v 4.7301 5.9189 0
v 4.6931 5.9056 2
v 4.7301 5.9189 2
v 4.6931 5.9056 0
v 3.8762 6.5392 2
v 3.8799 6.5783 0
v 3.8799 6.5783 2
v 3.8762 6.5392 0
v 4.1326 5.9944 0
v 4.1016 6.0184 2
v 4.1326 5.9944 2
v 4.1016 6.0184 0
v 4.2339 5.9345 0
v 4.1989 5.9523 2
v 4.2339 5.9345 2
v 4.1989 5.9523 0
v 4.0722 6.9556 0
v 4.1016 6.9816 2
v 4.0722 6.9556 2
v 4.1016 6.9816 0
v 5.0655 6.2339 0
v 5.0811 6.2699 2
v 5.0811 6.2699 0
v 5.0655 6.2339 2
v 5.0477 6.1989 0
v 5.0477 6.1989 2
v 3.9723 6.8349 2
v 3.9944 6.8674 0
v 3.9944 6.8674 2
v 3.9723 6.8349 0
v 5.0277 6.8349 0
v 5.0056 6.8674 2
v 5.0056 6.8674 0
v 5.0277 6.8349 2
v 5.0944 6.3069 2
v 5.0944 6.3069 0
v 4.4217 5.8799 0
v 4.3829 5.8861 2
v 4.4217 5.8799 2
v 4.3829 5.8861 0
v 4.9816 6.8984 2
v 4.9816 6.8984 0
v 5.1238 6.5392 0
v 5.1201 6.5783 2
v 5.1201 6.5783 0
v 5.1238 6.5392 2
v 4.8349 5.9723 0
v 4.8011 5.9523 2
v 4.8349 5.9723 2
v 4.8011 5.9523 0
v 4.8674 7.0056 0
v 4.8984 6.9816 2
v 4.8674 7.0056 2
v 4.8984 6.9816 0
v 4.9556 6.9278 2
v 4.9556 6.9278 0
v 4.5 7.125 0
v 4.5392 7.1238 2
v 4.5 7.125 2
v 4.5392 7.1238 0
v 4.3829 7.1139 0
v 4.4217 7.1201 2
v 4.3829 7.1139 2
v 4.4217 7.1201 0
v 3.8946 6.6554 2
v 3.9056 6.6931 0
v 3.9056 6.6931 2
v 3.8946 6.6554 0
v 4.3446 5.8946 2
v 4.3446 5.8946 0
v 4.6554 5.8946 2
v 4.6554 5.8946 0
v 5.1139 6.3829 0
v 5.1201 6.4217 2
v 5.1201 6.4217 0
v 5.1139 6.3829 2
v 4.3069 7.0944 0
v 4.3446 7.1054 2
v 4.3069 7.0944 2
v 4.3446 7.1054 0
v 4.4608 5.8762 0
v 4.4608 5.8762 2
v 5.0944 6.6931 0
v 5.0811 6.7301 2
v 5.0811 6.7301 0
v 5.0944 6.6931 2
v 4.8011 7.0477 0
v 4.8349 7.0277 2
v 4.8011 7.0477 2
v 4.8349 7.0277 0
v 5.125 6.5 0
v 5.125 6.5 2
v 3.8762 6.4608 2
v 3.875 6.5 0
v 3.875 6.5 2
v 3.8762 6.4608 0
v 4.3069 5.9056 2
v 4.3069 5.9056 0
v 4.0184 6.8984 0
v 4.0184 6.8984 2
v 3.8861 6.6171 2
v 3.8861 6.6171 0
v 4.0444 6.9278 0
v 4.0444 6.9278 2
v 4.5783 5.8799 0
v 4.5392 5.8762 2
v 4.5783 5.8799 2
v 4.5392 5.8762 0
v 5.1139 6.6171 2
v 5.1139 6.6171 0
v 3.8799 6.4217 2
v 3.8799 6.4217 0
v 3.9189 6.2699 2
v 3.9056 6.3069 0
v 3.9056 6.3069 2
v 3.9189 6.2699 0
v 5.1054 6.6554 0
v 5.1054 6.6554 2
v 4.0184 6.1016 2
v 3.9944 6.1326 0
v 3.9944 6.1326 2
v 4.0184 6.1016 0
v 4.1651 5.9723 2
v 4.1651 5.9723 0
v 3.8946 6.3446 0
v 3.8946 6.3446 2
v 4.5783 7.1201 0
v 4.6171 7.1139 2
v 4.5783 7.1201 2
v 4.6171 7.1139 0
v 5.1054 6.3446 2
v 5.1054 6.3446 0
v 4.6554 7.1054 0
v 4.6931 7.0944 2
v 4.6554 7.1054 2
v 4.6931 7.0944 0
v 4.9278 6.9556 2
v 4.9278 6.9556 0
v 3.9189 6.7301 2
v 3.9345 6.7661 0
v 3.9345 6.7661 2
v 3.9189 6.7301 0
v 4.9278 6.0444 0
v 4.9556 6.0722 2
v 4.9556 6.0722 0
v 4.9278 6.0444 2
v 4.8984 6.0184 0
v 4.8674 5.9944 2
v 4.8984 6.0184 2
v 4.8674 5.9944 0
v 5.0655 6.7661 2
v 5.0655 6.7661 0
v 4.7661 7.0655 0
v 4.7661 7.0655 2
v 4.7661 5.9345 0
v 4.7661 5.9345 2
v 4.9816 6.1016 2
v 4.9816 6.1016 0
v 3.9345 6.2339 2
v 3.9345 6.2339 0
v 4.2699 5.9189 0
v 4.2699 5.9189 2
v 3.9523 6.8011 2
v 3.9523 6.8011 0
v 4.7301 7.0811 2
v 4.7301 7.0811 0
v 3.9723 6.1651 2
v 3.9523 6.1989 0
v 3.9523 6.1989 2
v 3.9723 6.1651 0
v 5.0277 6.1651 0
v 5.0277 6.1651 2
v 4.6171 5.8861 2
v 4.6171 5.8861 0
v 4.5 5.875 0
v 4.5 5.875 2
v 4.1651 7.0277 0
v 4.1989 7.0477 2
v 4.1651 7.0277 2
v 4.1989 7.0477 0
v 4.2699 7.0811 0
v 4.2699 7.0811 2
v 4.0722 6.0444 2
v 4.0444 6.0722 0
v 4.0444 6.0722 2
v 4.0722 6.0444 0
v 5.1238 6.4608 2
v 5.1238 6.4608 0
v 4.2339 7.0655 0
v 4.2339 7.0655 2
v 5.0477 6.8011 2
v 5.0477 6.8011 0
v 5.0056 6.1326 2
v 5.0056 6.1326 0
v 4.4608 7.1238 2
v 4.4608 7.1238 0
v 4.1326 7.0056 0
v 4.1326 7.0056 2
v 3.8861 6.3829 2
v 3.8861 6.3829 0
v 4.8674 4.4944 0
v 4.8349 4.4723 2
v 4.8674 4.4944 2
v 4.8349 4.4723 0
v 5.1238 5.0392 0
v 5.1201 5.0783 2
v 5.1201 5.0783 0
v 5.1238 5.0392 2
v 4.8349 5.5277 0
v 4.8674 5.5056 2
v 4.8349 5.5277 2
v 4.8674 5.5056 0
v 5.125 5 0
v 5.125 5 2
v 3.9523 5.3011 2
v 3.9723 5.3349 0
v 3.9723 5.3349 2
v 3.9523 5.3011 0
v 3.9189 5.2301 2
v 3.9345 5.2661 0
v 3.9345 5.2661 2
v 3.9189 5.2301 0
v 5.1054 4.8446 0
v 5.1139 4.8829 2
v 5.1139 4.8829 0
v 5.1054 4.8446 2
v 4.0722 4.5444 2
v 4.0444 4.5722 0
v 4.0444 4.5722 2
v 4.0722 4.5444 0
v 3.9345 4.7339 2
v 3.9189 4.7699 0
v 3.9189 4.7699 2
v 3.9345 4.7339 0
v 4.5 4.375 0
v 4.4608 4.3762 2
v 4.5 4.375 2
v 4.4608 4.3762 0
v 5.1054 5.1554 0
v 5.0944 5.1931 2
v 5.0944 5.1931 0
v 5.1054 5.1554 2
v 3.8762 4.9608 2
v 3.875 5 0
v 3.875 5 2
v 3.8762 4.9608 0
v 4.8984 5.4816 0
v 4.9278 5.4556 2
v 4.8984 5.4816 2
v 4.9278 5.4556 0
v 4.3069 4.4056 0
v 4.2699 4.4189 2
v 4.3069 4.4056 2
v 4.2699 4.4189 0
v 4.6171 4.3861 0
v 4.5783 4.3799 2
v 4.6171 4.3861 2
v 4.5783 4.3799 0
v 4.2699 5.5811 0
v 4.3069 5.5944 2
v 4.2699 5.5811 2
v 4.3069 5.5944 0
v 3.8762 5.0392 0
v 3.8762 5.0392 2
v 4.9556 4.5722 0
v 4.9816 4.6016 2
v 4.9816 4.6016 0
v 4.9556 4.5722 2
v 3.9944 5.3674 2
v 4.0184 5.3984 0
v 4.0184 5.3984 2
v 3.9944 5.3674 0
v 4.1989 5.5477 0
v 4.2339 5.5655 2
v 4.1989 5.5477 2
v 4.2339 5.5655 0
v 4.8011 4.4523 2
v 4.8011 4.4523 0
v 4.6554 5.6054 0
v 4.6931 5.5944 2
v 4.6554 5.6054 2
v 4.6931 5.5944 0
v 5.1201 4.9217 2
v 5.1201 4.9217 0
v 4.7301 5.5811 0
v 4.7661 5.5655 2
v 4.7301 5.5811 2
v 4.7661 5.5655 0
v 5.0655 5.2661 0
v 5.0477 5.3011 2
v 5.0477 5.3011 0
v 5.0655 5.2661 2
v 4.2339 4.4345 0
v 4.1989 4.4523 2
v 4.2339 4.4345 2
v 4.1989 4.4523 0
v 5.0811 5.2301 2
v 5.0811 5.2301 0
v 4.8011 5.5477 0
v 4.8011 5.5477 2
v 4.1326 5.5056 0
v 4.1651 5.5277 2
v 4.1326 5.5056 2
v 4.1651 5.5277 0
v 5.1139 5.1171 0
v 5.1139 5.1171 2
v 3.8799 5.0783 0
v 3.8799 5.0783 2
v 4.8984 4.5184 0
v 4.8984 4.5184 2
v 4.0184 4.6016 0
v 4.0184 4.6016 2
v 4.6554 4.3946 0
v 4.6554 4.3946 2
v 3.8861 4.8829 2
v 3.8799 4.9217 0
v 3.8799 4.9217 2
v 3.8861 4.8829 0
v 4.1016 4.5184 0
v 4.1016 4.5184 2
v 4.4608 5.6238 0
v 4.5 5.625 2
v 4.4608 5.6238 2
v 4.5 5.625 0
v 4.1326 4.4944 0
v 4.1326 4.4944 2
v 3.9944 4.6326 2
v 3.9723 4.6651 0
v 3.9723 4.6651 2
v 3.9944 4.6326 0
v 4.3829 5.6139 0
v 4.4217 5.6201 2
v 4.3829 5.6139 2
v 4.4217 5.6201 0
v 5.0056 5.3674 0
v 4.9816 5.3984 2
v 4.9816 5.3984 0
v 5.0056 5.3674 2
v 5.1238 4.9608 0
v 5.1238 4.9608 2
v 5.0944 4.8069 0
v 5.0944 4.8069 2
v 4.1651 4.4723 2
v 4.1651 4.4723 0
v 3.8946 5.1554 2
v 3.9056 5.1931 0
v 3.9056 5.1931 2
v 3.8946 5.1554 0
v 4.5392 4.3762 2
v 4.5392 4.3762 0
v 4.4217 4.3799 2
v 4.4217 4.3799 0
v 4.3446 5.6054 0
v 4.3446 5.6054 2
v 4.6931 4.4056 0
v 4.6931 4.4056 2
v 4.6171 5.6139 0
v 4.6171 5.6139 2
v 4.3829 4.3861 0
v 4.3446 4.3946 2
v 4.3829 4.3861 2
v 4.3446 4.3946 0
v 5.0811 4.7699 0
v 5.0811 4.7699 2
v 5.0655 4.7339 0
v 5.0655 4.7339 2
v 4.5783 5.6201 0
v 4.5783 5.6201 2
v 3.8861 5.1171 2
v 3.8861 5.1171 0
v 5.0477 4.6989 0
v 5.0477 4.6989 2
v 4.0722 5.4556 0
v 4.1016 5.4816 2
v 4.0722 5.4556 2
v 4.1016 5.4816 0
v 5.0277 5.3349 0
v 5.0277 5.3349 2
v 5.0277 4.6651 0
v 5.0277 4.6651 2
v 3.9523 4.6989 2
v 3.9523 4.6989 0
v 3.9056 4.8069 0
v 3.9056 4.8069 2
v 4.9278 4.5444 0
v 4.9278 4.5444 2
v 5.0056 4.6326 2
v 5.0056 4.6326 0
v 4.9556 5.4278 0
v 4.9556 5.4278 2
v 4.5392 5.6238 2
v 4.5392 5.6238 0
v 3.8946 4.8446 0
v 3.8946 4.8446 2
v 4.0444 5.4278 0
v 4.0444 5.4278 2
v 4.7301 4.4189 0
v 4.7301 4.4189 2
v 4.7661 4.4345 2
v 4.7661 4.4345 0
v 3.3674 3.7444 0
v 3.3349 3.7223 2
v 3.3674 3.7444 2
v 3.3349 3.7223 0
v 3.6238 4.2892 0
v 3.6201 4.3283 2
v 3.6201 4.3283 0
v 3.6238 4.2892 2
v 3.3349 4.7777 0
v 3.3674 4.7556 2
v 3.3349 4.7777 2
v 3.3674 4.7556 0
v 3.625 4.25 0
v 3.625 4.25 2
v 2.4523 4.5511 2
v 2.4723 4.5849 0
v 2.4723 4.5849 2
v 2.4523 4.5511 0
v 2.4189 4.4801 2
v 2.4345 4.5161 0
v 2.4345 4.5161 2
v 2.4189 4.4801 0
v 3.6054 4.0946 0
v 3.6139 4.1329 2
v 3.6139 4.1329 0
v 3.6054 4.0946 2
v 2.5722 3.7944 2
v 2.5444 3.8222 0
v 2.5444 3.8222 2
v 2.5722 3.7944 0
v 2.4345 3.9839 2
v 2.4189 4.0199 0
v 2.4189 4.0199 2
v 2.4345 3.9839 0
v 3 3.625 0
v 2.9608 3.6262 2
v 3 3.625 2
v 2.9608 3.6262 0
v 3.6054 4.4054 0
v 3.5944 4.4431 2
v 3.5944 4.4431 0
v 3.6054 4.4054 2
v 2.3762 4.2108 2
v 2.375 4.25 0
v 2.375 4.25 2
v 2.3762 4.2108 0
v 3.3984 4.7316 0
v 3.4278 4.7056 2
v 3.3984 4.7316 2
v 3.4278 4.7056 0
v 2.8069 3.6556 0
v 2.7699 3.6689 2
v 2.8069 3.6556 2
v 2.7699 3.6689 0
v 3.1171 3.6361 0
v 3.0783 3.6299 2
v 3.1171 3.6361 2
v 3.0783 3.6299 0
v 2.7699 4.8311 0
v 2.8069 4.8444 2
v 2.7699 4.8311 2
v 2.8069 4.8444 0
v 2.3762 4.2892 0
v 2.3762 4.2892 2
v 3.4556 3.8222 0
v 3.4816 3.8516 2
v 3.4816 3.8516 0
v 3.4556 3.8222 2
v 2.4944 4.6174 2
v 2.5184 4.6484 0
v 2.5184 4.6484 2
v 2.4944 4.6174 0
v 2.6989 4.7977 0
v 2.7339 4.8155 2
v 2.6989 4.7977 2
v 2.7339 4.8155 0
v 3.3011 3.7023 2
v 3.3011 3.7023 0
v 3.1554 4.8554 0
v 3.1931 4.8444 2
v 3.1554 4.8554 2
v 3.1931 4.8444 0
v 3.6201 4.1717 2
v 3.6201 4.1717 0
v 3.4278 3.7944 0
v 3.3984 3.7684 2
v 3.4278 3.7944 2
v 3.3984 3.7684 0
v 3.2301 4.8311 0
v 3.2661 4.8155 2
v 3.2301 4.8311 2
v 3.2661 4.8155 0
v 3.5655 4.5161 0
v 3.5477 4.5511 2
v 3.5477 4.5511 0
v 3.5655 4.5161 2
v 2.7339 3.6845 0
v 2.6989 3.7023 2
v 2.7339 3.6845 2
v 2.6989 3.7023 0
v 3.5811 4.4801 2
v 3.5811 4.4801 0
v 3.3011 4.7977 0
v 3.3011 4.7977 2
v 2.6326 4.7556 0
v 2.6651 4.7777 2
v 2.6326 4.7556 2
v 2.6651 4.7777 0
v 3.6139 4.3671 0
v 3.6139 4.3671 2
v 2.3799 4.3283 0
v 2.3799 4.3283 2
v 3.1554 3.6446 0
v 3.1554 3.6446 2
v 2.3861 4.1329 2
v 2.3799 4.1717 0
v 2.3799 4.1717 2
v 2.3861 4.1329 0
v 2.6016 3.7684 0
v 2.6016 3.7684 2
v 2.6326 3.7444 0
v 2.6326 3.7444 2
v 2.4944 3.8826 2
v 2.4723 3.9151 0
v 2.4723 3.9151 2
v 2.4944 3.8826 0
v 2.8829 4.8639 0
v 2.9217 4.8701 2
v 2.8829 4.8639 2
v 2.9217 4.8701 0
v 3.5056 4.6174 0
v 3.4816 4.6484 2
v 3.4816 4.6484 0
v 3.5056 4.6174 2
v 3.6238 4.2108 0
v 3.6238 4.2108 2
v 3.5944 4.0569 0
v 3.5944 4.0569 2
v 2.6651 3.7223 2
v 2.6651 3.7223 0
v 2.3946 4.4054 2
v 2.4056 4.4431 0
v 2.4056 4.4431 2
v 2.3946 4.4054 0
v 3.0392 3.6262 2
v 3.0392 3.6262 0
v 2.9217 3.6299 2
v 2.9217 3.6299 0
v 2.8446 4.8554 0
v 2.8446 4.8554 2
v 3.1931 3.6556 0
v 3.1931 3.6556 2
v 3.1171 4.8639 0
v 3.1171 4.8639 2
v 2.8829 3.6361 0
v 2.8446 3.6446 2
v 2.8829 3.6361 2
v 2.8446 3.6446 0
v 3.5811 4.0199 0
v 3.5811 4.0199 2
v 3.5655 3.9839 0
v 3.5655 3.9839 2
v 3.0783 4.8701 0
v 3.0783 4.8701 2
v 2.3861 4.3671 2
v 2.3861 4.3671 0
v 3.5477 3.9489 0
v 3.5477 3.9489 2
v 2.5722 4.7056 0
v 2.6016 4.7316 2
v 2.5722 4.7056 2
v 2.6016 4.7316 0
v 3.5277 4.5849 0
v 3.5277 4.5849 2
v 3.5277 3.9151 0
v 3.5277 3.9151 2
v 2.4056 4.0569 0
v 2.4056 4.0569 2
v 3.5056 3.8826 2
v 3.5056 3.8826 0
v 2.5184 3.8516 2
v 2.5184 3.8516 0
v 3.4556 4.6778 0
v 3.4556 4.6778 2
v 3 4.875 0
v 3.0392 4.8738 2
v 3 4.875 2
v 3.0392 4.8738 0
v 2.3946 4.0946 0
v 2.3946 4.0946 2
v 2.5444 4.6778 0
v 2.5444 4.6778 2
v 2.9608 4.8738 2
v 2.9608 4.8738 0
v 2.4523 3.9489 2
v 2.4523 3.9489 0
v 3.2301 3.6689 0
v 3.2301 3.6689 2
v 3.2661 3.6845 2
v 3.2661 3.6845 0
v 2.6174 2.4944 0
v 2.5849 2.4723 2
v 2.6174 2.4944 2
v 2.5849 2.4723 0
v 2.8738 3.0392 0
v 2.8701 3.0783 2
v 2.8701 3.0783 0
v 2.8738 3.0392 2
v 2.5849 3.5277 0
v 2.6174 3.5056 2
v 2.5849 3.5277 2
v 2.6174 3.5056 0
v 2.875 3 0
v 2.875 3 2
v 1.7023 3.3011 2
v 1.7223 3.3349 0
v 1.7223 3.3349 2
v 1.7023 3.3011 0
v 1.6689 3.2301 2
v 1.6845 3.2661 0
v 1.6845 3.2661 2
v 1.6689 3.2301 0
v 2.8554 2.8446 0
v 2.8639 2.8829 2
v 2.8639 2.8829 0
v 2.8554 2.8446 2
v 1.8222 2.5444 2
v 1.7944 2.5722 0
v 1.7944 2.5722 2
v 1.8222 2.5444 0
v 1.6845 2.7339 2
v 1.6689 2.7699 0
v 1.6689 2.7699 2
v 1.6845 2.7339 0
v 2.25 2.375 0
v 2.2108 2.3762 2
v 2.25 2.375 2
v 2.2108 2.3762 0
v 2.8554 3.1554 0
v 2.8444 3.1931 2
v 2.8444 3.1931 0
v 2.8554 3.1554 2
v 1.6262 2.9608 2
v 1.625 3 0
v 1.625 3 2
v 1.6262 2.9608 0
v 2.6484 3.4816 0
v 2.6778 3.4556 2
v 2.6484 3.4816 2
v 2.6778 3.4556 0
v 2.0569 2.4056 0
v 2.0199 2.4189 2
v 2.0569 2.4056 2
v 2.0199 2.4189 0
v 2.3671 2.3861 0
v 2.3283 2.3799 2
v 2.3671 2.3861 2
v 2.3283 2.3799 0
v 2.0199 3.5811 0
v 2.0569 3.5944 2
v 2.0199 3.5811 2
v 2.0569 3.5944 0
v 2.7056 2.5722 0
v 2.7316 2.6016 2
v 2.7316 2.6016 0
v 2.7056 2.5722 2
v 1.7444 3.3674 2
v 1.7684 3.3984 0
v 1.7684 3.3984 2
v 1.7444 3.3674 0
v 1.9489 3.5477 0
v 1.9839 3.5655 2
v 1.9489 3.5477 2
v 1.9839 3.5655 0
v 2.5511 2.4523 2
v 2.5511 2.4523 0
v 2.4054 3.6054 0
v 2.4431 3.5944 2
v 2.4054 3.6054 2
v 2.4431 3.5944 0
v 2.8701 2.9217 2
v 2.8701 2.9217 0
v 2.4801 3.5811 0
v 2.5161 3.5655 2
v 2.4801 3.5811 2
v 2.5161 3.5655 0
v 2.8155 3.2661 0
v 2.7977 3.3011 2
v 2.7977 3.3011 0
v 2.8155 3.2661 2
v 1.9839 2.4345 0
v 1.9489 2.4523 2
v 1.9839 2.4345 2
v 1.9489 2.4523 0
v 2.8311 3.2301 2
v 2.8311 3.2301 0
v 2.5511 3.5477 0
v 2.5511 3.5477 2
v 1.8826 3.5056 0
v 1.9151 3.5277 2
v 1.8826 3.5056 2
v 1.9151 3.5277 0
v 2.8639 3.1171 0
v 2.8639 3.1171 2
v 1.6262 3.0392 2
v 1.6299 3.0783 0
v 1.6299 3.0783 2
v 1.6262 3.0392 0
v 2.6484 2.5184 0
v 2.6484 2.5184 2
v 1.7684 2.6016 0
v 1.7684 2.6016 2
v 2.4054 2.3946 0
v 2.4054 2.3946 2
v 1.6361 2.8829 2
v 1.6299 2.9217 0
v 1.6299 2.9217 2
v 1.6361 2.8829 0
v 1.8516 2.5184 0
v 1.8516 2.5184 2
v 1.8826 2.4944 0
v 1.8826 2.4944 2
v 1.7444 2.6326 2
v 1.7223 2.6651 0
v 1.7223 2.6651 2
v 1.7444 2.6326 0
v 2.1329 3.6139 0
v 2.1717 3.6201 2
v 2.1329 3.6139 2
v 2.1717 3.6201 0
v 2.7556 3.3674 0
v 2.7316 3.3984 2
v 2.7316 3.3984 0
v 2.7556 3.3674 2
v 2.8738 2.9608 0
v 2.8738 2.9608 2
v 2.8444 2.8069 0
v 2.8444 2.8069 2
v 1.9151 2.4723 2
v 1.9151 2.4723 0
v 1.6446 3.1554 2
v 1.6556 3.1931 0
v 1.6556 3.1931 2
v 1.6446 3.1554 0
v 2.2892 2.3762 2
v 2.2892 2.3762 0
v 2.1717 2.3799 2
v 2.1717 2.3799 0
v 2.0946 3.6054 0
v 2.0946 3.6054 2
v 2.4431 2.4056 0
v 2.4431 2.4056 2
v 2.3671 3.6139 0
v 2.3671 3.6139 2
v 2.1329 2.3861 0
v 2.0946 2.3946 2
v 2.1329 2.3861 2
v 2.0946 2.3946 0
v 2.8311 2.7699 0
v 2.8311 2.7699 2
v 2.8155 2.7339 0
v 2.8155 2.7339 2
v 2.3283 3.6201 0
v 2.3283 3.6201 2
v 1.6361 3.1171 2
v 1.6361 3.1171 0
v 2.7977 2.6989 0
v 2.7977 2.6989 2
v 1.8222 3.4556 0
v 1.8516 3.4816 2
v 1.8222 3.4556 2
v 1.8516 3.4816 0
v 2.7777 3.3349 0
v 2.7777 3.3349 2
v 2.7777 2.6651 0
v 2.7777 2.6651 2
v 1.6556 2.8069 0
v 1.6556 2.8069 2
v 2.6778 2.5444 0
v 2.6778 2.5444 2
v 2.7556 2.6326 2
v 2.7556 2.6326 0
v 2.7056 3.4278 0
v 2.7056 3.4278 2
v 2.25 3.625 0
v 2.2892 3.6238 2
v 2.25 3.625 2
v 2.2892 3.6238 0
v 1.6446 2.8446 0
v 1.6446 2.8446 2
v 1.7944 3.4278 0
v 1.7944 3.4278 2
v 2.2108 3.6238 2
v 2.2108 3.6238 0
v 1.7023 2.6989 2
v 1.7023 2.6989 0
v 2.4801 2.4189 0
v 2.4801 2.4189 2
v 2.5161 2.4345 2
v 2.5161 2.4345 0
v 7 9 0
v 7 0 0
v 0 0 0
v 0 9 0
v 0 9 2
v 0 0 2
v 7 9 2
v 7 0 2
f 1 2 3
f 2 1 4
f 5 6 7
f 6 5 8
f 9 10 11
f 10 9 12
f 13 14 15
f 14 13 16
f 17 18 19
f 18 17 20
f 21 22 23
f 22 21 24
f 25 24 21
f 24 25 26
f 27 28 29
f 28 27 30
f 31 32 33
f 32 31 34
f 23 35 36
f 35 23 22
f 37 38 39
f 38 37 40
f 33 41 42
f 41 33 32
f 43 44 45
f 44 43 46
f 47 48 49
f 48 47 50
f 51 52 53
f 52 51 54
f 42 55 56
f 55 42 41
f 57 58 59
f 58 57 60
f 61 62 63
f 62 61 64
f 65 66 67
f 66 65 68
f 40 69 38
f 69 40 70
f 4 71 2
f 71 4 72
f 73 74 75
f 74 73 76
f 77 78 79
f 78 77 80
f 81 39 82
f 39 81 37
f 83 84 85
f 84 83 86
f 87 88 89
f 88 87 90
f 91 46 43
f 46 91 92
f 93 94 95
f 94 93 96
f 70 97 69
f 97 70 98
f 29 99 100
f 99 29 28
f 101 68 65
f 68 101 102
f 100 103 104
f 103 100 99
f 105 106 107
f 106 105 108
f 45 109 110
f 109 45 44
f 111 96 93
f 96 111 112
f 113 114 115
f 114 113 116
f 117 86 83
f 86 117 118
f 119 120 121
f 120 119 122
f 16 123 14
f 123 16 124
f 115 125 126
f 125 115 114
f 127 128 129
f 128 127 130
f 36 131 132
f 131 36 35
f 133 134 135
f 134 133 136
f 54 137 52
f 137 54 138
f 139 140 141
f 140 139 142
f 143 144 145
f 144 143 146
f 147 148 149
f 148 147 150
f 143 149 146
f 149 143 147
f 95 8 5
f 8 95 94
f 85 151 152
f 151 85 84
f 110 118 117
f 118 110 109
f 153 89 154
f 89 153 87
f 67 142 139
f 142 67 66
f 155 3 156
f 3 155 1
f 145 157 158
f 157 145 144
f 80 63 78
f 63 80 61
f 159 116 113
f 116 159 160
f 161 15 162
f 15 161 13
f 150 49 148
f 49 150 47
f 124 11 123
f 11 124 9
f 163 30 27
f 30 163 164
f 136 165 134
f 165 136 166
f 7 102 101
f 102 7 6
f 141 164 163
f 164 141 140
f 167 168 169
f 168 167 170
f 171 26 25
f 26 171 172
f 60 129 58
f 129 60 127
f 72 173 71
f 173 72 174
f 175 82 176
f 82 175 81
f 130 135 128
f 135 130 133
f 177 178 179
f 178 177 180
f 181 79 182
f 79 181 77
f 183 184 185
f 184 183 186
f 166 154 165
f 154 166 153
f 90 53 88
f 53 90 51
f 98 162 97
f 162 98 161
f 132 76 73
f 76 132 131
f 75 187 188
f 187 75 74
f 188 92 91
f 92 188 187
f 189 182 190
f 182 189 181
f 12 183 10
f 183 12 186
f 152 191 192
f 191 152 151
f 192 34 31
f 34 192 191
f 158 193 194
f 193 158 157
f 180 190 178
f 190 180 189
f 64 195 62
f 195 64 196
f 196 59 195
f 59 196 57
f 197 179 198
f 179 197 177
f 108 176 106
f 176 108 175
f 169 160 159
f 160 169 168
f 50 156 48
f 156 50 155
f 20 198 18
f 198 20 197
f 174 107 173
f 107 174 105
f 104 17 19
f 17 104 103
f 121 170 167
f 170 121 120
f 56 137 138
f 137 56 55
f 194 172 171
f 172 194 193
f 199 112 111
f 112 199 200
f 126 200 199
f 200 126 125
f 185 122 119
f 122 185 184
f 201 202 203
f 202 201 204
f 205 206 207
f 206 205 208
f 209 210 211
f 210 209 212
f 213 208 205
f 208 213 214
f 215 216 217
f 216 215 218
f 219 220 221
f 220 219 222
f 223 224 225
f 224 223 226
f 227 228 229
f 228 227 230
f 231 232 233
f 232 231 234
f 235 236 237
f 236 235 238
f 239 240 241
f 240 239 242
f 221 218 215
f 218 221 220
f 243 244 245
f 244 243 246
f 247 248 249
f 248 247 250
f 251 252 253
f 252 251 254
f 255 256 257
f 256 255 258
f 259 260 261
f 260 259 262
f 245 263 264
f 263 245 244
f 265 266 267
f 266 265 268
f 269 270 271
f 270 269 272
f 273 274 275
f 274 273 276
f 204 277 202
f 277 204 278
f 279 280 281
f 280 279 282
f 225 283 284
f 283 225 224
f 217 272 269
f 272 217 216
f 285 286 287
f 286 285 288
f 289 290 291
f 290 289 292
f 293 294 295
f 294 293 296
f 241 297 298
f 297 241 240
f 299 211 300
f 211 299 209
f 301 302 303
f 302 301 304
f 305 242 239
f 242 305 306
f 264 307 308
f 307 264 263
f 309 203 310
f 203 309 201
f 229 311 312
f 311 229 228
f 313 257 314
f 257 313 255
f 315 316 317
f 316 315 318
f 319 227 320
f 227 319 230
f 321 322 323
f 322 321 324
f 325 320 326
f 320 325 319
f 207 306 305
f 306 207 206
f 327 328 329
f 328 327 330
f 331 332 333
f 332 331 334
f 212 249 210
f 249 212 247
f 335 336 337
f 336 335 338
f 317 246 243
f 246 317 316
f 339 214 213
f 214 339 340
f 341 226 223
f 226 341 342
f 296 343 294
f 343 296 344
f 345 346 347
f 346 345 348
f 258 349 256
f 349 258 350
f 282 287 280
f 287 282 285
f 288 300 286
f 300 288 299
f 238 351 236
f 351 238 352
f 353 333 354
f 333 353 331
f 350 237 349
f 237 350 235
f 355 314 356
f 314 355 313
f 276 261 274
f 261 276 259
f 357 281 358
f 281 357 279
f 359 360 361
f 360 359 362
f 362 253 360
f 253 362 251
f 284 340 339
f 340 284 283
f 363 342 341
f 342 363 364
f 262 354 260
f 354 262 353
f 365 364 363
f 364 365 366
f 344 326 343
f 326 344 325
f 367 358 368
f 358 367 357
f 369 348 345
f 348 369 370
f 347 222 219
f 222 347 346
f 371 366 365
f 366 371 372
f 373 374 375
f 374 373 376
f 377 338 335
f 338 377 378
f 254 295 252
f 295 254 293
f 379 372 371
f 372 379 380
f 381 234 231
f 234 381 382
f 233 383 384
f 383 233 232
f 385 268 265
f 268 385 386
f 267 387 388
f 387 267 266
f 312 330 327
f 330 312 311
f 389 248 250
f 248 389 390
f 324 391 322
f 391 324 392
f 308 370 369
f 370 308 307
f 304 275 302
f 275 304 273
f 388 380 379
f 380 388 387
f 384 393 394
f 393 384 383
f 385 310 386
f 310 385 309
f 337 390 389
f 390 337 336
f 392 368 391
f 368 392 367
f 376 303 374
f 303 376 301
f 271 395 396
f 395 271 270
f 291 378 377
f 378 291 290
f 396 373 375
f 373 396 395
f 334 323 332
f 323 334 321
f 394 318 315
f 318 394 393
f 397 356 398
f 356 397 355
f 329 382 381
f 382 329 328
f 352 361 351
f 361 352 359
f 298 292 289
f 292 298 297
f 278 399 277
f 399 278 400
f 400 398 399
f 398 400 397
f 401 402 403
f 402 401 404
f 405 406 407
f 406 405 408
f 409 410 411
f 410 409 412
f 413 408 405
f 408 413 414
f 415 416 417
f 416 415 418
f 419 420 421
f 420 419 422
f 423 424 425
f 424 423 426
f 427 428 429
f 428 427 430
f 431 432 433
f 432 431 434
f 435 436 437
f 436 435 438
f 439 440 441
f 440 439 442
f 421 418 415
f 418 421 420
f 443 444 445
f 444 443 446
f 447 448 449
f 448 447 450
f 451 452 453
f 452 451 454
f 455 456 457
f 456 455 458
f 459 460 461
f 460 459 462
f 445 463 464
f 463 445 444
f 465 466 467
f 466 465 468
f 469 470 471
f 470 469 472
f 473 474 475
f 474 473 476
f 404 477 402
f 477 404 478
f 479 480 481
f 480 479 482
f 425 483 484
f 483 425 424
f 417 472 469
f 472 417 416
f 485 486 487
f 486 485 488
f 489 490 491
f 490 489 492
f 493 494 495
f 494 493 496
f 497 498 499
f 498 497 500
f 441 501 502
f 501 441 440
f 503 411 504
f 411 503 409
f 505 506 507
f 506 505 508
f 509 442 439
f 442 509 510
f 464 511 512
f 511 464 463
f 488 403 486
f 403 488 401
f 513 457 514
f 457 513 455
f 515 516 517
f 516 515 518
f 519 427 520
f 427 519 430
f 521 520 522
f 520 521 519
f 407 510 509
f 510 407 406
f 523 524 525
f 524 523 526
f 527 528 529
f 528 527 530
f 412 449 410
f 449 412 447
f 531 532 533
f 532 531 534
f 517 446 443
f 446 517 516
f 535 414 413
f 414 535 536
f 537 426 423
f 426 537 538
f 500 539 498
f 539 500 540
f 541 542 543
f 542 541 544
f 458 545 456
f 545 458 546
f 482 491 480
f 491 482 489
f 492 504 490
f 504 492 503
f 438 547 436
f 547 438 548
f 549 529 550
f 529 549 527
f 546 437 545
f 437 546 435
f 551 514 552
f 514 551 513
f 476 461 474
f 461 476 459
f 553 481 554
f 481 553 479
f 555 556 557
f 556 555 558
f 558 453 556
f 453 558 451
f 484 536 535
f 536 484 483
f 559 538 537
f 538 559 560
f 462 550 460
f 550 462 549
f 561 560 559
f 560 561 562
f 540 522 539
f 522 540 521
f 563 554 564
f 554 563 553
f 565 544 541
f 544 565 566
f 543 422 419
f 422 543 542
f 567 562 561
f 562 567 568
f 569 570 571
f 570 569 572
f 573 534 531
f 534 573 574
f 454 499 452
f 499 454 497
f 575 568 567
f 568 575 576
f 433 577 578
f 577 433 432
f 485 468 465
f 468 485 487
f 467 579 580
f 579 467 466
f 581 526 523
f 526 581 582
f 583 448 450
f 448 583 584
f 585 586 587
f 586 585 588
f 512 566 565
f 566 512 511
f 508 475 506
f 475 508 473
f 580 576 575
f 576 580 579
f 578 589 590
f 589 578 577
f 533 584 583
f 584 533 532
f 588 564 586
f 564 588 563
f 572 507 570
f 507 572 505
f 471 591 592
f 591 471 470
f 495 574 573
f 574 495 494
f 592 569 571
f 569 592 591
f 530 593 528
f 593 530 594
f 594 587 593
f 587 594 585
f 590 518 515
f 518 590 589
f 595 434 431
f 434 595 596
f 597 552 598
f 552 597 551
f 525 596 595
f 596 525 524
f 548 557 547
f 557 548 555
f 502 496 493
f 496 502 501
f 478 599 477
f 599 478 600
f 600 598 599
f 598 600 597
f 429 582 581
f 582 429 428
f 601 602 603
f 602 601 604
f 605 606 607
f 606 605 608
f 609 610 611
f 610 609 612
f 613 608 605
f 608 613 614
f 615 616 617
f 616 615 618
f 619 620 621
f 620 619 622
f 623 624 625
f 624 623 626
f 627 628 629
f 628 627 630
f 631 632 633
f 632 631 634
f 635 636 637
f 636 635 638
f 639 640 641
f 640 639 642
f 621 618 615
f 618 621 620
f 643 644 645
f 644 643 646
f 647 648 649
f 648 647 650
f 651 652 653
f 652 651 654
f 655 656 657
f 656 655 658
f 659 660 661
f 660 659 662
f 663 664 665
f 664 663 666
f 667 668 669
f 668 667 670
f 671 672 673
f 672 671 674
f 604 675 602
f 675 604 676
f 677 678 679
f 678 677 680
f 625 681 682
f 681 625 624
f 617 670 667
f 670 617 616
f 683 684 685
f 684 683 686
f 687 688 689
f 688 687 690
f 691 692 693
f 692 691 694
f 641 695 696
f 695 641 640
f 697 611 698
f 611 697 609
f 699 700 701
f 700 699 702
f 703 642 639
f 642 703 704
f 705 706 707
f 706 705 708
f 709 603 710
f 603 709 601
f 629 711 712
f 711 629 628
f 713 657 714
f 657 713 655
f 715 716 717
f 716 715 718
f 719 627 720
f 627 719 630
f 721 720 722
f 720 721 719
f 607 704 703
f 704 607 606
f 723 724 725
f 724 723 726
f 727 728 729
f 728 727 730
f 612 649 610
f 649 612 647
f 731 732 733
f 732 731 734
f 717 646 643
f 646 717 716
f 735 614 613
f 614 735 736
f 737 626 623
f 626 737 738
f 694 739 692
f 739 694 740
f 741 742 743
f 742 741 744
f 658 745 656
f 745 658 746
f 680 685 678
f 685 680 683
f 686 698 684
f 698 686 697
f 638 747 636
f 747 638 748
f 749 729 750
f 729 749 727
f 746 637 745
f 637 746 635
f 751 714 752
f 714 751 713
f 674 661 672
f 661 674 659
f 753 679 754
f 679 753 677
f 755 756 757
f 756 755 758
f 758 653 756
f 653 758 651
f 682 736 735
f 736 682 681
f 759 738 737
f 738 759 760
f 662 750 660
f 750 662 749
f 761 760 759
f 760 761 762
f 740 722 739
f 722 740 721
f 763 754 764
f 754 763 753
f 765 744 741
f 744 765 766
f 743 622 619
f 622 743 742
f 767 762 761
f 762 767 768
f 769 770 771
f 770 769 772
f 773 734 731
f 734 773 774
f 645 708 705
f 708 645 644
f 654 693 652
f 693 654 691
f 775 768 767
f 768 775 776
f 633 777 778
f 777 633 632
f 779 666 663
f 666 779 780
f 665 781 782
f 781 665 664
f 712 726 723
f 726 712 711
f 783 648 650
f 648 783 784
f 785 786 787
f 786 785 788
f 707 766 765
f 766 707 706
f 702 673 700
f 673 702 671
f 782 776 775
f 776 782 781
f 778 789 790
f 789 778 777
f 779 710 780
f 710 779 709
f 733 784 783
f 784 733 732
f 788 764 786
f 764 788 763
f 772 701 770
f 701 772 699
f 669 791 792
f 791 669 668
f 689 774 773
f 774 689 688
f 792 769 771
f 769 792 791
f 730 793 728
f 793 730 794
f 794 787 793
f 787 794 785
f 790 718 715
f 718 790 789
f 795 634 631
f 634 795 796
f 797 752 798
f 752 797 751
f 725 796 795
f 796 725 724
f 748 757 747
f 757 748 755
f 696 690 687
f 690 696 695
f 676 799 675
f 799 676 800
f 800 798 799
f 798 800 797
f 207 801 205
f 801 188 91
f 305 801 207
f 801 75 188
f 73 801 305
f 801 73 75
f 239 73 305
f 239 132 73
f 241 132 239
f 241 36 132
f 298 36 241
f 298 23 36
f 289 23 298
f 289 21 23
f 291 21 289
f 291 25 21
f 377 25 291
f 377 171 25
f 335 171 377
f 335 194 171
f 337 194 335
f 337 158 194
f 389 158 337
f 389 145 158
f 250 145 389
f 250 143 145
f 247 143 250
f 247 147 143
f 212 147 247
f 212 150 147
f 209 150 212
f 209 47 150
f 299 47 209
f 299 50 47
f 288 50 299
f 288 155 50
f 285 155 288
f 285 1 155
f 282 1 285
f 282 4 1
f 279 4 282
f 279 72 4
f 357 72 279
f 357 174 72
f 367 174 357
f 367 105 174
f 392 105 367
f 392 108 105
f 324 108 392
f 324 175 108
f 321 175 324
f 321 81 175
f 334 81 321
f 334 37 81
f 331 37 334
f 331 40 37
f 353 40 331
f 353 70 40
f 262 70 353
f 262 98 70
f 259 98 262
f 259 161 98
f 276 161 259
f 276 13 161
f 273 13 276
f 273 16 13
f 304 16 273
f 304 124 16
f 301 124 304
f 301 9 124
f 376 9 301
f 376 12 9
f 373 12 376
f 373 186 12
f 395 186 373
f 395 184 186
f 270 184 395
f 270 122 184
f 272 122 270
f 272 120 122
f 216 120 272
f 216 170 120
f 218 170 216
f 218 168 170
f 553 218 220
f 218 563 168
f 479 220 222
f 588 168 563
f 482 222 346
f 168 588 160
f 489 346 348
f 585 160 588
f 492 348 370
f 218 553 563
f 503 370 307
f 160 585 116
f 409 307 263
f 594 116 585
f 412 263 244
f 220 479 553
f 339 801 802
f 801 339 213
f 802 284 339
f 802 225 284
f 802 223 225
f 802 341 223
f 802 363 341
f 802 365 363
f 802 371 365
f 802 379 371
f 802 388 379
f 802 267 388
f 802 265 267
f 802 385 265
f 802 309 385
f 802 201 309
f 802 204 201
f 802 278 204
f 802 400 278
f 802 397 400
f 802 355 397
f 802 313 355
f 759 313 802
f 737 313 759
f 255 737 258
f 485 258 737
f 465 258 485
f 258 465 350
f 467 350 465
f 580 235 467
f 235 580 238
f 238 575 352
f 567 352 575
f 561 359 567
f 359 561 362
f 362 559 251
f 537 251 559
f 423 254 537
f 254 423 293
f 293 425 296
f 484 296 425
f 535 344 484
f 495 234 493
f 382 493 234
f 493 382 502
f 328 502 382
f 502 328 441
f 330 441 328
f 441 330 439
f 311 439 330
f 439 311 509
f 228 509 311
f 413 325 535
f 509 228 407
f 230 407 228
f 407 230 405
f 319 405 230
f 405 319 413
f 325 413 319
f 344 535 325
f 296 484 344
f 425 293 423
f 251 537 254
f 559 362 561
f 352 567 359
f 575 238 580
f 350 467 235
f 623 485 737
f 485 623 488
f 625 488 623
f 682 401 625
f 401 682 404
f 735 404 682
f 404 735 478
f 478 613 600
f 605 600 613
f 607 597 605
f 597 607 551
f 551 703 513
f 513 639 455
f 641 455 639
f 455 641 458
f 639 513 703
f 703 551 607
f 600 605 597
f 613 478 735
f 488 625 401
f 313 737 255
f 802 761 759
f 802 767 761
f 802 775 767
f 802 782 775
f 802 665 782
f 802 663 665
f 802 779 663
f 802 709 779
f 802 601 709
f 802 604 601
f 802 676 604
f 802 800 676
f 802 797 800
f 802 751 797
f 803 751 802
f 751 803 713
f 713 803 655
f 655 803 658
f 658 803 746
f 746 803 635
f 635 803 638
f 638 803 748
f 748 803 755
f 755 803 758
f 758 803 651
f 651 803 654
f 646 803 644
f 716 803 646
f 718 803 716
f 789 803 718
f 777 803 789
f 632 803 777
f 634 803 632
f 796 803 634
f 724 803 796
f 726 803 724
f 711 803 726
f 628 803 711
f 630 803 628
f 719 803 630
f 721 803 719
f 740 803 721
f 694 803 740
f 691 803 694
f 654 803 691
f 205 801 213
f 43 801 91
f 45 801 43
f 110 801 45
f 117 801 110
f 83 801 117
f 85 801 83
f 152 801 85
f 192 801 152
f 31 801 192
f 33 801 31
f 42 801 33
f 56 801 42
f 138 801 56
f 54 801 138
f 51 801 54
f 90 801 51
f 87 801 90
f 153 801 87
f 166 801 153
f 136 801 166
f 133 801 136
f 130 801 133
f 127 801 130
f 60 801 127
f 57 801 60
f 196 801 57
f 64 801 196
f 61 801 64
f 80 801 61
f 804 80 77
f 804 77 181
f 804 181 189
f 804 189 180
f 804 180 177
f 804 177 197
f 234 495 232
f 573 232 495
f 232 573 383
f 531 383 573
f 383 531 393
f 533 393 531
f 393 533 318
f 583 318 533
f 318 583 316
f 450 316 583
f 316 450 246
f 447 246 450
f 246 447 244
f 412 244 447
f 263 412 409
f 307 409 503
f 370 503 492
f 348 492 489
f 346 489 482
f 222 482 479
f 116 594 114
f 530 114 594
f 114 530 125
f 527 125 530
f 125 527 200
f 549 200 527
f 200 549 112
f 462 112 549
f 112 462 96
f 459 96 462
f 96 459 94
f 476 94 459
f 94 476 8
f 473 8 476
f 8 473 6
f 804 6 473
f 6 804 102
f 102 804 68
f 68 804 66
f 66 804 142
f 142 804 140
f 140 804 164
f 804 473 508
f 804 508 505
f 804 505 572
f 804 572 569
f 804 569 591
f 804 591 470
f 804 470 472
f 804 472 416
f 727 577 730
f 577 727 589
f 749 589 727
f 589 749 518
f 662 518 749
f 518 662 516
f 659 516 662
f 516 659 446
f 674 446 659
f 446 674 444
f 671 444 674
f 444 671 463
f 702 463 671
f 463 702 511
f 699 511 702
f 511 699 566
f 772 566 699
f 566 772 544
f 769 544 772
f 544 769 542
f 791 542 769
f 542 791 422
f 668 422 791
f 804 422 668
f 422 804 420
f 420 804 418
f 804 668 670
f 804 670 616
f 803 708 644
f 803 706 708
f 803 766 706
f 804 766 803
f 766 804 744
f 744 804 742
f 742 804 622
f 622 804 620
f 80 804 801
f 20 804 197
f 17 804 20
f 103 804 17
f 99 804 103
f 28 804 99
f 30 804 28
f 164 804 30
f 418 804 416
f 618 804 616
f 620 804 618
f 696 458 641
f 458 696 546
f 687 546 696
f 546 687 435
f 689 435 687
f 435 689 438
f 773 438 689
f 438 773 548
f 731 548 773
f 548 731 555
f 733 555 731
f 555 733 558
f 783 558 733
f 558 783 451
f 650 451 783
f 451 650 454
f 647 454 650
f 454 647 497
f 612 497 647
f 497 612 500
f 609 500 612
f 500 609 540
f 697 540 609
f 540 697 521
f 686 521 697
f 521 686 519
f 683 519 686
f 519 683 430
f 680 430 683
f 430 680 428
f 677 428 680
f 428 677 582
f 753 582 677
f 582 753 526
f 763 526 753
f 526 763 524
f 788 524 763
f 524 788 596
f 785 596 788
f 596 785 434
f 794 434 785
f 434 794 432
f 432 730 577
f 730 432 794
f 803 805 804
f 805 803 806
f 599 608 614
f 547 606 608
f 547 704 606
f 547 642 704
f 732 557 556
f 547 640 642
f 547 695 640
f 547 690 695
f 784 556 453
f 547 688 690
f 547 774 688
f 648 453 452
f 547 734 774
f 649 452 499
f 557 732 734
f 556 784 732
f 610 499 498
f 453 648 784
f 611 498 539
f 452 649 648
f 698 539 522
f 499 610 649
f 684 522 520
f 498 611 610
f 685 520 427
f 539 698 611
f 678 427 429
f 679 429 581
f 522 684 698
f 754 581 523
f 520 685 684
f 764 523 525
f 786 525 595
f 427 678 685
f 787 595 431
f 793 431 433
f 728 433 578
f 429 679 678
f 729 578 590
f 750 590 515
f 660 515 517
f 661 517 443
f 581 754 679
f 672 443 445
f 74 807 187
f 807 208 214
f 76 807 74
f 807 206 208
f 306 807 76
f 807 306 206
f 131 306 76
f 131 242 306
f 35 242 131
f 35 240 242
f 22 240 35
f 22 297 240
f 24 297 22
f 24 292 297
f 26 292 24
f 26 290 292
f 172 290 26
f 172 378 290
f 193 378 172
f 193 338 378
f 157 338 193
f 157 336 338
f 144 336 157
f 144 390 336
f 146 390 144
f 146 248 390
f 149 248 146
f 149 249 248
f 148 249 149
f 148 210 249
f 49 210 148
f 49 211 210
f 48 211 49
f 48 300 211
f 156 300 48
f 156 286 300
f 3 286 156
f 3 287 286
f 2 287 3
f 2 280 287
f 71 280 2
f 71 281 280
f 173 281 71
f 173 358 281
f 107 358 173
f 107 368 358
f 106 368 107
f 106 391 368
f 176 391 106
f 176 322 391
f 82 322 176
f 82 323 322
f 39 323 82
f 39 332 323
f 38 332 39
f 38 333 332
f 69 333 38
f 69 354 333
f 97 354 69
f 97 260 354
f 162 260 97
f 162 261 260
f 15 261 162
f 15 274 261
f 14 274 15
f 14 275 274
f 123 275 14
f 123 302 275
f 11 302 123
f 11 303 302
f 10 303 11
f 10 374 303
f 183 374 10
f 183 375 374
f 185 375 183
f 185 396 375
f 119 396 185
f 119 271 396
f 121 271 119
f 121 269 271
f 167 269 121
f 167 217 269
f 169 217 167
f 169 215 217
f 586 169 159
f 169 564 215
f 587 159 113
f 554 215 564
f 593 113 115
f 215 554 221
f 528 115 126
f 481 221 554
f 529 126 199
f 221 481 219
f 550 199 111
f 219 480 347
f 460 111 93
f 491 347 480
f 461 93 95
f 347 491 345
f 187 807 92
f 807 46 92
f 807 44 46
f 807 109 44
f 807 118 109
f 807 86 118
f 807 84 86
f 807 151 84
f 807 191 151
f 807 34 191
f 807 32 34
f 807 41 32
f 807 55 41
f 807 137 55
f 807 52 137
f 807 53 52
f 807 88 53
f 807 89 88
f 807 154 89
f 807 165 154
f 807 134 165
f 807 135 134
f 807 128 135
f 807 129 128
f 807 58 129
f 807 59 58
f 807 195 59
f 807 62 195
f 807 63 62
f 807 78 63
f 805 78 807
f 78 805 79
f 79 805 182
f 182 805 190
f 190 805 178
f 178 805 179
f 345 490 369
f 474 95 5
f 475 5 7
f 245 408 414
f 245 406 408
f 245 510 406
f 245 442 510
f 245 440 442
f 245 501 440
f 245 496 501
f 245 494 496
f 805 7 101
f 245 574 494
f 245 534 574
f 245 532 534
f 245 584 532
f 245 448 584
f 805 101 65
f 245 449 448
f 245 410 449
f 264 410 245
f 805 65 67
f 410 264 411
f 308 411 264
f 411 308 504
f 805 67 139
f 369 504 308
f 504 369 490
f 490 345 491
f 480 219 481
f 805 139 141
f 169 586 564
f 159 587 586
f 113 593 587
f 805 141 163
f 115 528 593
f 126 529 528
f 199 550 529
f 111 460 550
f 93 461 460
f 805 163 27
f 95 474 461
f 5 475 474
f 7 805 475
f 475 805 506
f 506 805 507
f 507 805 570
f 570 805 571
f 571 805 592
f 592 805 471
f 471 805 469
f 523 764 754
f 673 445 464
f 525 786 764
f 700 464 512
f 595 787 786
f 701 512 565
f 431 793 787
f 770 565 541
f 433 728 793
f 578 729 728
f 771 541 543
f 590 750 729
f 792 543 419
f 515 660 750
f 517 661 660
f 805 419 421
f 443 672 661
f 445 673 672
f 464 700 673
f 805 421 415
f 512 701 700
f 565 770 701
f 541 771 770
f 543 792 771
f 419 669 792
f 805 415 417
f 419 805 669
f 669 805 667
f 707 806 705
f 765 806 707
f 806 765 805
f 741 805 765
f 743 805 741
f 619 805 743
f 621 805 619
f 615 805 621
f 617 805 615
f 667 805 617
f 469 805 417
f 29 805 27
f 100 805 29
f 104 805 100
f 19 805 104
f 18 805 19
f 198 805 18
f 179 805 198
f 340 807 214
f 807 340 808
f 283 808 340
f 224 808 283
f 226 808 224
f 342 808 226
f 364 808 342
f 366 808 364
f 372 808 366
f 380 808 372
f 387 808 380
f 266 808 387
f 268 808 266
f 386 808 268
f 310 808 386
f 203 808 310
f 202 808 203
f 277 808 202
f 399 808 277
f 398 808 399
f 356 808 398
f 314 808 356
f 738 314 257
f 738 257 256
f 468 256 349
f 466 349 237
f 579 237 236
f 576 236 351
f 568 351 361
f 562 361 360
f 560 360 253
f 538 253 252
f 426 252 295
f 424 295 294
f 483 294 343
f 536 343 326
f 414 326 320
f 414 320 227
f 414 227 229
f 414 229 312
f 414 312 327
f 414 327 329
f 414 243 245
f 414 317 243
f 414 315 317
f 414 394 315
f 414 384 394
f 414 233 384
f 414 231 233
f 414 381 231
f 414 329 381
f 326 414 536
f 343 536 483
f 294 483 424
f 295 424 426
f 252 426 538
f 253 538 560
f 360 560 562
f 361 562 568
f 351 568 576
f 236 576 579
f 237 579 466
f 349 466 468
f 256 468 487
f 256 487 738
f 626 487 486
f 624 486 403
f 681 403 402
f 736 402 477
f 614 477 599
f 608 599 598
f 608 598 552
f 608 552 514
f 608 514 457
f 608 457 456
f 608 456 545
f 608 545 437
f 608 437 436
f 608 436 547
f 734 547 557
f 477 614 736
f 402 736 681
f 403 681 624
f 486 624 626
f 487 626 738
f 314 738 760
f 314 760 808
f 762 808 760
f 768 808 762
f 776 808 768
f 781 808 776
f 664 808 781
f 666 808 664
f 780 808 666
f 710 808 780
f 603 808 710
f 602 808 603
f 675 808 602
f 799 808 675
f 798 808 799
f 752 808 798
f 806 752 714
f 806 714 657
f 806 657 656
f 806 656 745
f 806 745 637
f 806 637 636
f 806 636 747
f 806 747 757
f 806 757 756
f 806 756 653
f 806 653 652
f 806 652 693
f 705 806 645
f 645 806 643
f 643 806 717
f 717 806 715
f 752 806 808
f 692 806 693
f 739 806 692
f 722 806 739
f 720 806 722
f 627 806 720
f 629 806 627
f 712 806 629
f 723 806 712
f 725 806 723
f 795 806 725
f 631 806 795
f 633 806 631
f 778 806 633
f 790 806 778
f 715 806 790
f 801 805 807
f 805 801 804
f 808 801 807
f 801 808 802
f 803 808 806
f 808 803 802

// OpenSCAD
$fn=100;
eps = .1;

thikness = 2;
boardD = [7,9];
pinhole = 1.25;
pinholeP = [4.5,6.5,0];


difference() {
    linear_extrude(thikness) square(boardD);
    translate([0,0,-eps/thikness]) {
        translate(pinholeP) linear_extrude(thikness+eps) circle(d=pinhole);
        translate([pinholeP.x, pinholeP.y-1.5, 0]) linear_extrude(thikness+eps) circle(d=pinhole);
        translate([pinholeP.x-1.5, pinholeP.y-2.25, 0]) linear_extrude(thikness+eps) circle(d=pinhole);
        translate([pinholeP.x-2.25, pinholeP.y-3.5, 0]) linear_extrude(thikness+eps) circle(d=pinhole);
    }
}
